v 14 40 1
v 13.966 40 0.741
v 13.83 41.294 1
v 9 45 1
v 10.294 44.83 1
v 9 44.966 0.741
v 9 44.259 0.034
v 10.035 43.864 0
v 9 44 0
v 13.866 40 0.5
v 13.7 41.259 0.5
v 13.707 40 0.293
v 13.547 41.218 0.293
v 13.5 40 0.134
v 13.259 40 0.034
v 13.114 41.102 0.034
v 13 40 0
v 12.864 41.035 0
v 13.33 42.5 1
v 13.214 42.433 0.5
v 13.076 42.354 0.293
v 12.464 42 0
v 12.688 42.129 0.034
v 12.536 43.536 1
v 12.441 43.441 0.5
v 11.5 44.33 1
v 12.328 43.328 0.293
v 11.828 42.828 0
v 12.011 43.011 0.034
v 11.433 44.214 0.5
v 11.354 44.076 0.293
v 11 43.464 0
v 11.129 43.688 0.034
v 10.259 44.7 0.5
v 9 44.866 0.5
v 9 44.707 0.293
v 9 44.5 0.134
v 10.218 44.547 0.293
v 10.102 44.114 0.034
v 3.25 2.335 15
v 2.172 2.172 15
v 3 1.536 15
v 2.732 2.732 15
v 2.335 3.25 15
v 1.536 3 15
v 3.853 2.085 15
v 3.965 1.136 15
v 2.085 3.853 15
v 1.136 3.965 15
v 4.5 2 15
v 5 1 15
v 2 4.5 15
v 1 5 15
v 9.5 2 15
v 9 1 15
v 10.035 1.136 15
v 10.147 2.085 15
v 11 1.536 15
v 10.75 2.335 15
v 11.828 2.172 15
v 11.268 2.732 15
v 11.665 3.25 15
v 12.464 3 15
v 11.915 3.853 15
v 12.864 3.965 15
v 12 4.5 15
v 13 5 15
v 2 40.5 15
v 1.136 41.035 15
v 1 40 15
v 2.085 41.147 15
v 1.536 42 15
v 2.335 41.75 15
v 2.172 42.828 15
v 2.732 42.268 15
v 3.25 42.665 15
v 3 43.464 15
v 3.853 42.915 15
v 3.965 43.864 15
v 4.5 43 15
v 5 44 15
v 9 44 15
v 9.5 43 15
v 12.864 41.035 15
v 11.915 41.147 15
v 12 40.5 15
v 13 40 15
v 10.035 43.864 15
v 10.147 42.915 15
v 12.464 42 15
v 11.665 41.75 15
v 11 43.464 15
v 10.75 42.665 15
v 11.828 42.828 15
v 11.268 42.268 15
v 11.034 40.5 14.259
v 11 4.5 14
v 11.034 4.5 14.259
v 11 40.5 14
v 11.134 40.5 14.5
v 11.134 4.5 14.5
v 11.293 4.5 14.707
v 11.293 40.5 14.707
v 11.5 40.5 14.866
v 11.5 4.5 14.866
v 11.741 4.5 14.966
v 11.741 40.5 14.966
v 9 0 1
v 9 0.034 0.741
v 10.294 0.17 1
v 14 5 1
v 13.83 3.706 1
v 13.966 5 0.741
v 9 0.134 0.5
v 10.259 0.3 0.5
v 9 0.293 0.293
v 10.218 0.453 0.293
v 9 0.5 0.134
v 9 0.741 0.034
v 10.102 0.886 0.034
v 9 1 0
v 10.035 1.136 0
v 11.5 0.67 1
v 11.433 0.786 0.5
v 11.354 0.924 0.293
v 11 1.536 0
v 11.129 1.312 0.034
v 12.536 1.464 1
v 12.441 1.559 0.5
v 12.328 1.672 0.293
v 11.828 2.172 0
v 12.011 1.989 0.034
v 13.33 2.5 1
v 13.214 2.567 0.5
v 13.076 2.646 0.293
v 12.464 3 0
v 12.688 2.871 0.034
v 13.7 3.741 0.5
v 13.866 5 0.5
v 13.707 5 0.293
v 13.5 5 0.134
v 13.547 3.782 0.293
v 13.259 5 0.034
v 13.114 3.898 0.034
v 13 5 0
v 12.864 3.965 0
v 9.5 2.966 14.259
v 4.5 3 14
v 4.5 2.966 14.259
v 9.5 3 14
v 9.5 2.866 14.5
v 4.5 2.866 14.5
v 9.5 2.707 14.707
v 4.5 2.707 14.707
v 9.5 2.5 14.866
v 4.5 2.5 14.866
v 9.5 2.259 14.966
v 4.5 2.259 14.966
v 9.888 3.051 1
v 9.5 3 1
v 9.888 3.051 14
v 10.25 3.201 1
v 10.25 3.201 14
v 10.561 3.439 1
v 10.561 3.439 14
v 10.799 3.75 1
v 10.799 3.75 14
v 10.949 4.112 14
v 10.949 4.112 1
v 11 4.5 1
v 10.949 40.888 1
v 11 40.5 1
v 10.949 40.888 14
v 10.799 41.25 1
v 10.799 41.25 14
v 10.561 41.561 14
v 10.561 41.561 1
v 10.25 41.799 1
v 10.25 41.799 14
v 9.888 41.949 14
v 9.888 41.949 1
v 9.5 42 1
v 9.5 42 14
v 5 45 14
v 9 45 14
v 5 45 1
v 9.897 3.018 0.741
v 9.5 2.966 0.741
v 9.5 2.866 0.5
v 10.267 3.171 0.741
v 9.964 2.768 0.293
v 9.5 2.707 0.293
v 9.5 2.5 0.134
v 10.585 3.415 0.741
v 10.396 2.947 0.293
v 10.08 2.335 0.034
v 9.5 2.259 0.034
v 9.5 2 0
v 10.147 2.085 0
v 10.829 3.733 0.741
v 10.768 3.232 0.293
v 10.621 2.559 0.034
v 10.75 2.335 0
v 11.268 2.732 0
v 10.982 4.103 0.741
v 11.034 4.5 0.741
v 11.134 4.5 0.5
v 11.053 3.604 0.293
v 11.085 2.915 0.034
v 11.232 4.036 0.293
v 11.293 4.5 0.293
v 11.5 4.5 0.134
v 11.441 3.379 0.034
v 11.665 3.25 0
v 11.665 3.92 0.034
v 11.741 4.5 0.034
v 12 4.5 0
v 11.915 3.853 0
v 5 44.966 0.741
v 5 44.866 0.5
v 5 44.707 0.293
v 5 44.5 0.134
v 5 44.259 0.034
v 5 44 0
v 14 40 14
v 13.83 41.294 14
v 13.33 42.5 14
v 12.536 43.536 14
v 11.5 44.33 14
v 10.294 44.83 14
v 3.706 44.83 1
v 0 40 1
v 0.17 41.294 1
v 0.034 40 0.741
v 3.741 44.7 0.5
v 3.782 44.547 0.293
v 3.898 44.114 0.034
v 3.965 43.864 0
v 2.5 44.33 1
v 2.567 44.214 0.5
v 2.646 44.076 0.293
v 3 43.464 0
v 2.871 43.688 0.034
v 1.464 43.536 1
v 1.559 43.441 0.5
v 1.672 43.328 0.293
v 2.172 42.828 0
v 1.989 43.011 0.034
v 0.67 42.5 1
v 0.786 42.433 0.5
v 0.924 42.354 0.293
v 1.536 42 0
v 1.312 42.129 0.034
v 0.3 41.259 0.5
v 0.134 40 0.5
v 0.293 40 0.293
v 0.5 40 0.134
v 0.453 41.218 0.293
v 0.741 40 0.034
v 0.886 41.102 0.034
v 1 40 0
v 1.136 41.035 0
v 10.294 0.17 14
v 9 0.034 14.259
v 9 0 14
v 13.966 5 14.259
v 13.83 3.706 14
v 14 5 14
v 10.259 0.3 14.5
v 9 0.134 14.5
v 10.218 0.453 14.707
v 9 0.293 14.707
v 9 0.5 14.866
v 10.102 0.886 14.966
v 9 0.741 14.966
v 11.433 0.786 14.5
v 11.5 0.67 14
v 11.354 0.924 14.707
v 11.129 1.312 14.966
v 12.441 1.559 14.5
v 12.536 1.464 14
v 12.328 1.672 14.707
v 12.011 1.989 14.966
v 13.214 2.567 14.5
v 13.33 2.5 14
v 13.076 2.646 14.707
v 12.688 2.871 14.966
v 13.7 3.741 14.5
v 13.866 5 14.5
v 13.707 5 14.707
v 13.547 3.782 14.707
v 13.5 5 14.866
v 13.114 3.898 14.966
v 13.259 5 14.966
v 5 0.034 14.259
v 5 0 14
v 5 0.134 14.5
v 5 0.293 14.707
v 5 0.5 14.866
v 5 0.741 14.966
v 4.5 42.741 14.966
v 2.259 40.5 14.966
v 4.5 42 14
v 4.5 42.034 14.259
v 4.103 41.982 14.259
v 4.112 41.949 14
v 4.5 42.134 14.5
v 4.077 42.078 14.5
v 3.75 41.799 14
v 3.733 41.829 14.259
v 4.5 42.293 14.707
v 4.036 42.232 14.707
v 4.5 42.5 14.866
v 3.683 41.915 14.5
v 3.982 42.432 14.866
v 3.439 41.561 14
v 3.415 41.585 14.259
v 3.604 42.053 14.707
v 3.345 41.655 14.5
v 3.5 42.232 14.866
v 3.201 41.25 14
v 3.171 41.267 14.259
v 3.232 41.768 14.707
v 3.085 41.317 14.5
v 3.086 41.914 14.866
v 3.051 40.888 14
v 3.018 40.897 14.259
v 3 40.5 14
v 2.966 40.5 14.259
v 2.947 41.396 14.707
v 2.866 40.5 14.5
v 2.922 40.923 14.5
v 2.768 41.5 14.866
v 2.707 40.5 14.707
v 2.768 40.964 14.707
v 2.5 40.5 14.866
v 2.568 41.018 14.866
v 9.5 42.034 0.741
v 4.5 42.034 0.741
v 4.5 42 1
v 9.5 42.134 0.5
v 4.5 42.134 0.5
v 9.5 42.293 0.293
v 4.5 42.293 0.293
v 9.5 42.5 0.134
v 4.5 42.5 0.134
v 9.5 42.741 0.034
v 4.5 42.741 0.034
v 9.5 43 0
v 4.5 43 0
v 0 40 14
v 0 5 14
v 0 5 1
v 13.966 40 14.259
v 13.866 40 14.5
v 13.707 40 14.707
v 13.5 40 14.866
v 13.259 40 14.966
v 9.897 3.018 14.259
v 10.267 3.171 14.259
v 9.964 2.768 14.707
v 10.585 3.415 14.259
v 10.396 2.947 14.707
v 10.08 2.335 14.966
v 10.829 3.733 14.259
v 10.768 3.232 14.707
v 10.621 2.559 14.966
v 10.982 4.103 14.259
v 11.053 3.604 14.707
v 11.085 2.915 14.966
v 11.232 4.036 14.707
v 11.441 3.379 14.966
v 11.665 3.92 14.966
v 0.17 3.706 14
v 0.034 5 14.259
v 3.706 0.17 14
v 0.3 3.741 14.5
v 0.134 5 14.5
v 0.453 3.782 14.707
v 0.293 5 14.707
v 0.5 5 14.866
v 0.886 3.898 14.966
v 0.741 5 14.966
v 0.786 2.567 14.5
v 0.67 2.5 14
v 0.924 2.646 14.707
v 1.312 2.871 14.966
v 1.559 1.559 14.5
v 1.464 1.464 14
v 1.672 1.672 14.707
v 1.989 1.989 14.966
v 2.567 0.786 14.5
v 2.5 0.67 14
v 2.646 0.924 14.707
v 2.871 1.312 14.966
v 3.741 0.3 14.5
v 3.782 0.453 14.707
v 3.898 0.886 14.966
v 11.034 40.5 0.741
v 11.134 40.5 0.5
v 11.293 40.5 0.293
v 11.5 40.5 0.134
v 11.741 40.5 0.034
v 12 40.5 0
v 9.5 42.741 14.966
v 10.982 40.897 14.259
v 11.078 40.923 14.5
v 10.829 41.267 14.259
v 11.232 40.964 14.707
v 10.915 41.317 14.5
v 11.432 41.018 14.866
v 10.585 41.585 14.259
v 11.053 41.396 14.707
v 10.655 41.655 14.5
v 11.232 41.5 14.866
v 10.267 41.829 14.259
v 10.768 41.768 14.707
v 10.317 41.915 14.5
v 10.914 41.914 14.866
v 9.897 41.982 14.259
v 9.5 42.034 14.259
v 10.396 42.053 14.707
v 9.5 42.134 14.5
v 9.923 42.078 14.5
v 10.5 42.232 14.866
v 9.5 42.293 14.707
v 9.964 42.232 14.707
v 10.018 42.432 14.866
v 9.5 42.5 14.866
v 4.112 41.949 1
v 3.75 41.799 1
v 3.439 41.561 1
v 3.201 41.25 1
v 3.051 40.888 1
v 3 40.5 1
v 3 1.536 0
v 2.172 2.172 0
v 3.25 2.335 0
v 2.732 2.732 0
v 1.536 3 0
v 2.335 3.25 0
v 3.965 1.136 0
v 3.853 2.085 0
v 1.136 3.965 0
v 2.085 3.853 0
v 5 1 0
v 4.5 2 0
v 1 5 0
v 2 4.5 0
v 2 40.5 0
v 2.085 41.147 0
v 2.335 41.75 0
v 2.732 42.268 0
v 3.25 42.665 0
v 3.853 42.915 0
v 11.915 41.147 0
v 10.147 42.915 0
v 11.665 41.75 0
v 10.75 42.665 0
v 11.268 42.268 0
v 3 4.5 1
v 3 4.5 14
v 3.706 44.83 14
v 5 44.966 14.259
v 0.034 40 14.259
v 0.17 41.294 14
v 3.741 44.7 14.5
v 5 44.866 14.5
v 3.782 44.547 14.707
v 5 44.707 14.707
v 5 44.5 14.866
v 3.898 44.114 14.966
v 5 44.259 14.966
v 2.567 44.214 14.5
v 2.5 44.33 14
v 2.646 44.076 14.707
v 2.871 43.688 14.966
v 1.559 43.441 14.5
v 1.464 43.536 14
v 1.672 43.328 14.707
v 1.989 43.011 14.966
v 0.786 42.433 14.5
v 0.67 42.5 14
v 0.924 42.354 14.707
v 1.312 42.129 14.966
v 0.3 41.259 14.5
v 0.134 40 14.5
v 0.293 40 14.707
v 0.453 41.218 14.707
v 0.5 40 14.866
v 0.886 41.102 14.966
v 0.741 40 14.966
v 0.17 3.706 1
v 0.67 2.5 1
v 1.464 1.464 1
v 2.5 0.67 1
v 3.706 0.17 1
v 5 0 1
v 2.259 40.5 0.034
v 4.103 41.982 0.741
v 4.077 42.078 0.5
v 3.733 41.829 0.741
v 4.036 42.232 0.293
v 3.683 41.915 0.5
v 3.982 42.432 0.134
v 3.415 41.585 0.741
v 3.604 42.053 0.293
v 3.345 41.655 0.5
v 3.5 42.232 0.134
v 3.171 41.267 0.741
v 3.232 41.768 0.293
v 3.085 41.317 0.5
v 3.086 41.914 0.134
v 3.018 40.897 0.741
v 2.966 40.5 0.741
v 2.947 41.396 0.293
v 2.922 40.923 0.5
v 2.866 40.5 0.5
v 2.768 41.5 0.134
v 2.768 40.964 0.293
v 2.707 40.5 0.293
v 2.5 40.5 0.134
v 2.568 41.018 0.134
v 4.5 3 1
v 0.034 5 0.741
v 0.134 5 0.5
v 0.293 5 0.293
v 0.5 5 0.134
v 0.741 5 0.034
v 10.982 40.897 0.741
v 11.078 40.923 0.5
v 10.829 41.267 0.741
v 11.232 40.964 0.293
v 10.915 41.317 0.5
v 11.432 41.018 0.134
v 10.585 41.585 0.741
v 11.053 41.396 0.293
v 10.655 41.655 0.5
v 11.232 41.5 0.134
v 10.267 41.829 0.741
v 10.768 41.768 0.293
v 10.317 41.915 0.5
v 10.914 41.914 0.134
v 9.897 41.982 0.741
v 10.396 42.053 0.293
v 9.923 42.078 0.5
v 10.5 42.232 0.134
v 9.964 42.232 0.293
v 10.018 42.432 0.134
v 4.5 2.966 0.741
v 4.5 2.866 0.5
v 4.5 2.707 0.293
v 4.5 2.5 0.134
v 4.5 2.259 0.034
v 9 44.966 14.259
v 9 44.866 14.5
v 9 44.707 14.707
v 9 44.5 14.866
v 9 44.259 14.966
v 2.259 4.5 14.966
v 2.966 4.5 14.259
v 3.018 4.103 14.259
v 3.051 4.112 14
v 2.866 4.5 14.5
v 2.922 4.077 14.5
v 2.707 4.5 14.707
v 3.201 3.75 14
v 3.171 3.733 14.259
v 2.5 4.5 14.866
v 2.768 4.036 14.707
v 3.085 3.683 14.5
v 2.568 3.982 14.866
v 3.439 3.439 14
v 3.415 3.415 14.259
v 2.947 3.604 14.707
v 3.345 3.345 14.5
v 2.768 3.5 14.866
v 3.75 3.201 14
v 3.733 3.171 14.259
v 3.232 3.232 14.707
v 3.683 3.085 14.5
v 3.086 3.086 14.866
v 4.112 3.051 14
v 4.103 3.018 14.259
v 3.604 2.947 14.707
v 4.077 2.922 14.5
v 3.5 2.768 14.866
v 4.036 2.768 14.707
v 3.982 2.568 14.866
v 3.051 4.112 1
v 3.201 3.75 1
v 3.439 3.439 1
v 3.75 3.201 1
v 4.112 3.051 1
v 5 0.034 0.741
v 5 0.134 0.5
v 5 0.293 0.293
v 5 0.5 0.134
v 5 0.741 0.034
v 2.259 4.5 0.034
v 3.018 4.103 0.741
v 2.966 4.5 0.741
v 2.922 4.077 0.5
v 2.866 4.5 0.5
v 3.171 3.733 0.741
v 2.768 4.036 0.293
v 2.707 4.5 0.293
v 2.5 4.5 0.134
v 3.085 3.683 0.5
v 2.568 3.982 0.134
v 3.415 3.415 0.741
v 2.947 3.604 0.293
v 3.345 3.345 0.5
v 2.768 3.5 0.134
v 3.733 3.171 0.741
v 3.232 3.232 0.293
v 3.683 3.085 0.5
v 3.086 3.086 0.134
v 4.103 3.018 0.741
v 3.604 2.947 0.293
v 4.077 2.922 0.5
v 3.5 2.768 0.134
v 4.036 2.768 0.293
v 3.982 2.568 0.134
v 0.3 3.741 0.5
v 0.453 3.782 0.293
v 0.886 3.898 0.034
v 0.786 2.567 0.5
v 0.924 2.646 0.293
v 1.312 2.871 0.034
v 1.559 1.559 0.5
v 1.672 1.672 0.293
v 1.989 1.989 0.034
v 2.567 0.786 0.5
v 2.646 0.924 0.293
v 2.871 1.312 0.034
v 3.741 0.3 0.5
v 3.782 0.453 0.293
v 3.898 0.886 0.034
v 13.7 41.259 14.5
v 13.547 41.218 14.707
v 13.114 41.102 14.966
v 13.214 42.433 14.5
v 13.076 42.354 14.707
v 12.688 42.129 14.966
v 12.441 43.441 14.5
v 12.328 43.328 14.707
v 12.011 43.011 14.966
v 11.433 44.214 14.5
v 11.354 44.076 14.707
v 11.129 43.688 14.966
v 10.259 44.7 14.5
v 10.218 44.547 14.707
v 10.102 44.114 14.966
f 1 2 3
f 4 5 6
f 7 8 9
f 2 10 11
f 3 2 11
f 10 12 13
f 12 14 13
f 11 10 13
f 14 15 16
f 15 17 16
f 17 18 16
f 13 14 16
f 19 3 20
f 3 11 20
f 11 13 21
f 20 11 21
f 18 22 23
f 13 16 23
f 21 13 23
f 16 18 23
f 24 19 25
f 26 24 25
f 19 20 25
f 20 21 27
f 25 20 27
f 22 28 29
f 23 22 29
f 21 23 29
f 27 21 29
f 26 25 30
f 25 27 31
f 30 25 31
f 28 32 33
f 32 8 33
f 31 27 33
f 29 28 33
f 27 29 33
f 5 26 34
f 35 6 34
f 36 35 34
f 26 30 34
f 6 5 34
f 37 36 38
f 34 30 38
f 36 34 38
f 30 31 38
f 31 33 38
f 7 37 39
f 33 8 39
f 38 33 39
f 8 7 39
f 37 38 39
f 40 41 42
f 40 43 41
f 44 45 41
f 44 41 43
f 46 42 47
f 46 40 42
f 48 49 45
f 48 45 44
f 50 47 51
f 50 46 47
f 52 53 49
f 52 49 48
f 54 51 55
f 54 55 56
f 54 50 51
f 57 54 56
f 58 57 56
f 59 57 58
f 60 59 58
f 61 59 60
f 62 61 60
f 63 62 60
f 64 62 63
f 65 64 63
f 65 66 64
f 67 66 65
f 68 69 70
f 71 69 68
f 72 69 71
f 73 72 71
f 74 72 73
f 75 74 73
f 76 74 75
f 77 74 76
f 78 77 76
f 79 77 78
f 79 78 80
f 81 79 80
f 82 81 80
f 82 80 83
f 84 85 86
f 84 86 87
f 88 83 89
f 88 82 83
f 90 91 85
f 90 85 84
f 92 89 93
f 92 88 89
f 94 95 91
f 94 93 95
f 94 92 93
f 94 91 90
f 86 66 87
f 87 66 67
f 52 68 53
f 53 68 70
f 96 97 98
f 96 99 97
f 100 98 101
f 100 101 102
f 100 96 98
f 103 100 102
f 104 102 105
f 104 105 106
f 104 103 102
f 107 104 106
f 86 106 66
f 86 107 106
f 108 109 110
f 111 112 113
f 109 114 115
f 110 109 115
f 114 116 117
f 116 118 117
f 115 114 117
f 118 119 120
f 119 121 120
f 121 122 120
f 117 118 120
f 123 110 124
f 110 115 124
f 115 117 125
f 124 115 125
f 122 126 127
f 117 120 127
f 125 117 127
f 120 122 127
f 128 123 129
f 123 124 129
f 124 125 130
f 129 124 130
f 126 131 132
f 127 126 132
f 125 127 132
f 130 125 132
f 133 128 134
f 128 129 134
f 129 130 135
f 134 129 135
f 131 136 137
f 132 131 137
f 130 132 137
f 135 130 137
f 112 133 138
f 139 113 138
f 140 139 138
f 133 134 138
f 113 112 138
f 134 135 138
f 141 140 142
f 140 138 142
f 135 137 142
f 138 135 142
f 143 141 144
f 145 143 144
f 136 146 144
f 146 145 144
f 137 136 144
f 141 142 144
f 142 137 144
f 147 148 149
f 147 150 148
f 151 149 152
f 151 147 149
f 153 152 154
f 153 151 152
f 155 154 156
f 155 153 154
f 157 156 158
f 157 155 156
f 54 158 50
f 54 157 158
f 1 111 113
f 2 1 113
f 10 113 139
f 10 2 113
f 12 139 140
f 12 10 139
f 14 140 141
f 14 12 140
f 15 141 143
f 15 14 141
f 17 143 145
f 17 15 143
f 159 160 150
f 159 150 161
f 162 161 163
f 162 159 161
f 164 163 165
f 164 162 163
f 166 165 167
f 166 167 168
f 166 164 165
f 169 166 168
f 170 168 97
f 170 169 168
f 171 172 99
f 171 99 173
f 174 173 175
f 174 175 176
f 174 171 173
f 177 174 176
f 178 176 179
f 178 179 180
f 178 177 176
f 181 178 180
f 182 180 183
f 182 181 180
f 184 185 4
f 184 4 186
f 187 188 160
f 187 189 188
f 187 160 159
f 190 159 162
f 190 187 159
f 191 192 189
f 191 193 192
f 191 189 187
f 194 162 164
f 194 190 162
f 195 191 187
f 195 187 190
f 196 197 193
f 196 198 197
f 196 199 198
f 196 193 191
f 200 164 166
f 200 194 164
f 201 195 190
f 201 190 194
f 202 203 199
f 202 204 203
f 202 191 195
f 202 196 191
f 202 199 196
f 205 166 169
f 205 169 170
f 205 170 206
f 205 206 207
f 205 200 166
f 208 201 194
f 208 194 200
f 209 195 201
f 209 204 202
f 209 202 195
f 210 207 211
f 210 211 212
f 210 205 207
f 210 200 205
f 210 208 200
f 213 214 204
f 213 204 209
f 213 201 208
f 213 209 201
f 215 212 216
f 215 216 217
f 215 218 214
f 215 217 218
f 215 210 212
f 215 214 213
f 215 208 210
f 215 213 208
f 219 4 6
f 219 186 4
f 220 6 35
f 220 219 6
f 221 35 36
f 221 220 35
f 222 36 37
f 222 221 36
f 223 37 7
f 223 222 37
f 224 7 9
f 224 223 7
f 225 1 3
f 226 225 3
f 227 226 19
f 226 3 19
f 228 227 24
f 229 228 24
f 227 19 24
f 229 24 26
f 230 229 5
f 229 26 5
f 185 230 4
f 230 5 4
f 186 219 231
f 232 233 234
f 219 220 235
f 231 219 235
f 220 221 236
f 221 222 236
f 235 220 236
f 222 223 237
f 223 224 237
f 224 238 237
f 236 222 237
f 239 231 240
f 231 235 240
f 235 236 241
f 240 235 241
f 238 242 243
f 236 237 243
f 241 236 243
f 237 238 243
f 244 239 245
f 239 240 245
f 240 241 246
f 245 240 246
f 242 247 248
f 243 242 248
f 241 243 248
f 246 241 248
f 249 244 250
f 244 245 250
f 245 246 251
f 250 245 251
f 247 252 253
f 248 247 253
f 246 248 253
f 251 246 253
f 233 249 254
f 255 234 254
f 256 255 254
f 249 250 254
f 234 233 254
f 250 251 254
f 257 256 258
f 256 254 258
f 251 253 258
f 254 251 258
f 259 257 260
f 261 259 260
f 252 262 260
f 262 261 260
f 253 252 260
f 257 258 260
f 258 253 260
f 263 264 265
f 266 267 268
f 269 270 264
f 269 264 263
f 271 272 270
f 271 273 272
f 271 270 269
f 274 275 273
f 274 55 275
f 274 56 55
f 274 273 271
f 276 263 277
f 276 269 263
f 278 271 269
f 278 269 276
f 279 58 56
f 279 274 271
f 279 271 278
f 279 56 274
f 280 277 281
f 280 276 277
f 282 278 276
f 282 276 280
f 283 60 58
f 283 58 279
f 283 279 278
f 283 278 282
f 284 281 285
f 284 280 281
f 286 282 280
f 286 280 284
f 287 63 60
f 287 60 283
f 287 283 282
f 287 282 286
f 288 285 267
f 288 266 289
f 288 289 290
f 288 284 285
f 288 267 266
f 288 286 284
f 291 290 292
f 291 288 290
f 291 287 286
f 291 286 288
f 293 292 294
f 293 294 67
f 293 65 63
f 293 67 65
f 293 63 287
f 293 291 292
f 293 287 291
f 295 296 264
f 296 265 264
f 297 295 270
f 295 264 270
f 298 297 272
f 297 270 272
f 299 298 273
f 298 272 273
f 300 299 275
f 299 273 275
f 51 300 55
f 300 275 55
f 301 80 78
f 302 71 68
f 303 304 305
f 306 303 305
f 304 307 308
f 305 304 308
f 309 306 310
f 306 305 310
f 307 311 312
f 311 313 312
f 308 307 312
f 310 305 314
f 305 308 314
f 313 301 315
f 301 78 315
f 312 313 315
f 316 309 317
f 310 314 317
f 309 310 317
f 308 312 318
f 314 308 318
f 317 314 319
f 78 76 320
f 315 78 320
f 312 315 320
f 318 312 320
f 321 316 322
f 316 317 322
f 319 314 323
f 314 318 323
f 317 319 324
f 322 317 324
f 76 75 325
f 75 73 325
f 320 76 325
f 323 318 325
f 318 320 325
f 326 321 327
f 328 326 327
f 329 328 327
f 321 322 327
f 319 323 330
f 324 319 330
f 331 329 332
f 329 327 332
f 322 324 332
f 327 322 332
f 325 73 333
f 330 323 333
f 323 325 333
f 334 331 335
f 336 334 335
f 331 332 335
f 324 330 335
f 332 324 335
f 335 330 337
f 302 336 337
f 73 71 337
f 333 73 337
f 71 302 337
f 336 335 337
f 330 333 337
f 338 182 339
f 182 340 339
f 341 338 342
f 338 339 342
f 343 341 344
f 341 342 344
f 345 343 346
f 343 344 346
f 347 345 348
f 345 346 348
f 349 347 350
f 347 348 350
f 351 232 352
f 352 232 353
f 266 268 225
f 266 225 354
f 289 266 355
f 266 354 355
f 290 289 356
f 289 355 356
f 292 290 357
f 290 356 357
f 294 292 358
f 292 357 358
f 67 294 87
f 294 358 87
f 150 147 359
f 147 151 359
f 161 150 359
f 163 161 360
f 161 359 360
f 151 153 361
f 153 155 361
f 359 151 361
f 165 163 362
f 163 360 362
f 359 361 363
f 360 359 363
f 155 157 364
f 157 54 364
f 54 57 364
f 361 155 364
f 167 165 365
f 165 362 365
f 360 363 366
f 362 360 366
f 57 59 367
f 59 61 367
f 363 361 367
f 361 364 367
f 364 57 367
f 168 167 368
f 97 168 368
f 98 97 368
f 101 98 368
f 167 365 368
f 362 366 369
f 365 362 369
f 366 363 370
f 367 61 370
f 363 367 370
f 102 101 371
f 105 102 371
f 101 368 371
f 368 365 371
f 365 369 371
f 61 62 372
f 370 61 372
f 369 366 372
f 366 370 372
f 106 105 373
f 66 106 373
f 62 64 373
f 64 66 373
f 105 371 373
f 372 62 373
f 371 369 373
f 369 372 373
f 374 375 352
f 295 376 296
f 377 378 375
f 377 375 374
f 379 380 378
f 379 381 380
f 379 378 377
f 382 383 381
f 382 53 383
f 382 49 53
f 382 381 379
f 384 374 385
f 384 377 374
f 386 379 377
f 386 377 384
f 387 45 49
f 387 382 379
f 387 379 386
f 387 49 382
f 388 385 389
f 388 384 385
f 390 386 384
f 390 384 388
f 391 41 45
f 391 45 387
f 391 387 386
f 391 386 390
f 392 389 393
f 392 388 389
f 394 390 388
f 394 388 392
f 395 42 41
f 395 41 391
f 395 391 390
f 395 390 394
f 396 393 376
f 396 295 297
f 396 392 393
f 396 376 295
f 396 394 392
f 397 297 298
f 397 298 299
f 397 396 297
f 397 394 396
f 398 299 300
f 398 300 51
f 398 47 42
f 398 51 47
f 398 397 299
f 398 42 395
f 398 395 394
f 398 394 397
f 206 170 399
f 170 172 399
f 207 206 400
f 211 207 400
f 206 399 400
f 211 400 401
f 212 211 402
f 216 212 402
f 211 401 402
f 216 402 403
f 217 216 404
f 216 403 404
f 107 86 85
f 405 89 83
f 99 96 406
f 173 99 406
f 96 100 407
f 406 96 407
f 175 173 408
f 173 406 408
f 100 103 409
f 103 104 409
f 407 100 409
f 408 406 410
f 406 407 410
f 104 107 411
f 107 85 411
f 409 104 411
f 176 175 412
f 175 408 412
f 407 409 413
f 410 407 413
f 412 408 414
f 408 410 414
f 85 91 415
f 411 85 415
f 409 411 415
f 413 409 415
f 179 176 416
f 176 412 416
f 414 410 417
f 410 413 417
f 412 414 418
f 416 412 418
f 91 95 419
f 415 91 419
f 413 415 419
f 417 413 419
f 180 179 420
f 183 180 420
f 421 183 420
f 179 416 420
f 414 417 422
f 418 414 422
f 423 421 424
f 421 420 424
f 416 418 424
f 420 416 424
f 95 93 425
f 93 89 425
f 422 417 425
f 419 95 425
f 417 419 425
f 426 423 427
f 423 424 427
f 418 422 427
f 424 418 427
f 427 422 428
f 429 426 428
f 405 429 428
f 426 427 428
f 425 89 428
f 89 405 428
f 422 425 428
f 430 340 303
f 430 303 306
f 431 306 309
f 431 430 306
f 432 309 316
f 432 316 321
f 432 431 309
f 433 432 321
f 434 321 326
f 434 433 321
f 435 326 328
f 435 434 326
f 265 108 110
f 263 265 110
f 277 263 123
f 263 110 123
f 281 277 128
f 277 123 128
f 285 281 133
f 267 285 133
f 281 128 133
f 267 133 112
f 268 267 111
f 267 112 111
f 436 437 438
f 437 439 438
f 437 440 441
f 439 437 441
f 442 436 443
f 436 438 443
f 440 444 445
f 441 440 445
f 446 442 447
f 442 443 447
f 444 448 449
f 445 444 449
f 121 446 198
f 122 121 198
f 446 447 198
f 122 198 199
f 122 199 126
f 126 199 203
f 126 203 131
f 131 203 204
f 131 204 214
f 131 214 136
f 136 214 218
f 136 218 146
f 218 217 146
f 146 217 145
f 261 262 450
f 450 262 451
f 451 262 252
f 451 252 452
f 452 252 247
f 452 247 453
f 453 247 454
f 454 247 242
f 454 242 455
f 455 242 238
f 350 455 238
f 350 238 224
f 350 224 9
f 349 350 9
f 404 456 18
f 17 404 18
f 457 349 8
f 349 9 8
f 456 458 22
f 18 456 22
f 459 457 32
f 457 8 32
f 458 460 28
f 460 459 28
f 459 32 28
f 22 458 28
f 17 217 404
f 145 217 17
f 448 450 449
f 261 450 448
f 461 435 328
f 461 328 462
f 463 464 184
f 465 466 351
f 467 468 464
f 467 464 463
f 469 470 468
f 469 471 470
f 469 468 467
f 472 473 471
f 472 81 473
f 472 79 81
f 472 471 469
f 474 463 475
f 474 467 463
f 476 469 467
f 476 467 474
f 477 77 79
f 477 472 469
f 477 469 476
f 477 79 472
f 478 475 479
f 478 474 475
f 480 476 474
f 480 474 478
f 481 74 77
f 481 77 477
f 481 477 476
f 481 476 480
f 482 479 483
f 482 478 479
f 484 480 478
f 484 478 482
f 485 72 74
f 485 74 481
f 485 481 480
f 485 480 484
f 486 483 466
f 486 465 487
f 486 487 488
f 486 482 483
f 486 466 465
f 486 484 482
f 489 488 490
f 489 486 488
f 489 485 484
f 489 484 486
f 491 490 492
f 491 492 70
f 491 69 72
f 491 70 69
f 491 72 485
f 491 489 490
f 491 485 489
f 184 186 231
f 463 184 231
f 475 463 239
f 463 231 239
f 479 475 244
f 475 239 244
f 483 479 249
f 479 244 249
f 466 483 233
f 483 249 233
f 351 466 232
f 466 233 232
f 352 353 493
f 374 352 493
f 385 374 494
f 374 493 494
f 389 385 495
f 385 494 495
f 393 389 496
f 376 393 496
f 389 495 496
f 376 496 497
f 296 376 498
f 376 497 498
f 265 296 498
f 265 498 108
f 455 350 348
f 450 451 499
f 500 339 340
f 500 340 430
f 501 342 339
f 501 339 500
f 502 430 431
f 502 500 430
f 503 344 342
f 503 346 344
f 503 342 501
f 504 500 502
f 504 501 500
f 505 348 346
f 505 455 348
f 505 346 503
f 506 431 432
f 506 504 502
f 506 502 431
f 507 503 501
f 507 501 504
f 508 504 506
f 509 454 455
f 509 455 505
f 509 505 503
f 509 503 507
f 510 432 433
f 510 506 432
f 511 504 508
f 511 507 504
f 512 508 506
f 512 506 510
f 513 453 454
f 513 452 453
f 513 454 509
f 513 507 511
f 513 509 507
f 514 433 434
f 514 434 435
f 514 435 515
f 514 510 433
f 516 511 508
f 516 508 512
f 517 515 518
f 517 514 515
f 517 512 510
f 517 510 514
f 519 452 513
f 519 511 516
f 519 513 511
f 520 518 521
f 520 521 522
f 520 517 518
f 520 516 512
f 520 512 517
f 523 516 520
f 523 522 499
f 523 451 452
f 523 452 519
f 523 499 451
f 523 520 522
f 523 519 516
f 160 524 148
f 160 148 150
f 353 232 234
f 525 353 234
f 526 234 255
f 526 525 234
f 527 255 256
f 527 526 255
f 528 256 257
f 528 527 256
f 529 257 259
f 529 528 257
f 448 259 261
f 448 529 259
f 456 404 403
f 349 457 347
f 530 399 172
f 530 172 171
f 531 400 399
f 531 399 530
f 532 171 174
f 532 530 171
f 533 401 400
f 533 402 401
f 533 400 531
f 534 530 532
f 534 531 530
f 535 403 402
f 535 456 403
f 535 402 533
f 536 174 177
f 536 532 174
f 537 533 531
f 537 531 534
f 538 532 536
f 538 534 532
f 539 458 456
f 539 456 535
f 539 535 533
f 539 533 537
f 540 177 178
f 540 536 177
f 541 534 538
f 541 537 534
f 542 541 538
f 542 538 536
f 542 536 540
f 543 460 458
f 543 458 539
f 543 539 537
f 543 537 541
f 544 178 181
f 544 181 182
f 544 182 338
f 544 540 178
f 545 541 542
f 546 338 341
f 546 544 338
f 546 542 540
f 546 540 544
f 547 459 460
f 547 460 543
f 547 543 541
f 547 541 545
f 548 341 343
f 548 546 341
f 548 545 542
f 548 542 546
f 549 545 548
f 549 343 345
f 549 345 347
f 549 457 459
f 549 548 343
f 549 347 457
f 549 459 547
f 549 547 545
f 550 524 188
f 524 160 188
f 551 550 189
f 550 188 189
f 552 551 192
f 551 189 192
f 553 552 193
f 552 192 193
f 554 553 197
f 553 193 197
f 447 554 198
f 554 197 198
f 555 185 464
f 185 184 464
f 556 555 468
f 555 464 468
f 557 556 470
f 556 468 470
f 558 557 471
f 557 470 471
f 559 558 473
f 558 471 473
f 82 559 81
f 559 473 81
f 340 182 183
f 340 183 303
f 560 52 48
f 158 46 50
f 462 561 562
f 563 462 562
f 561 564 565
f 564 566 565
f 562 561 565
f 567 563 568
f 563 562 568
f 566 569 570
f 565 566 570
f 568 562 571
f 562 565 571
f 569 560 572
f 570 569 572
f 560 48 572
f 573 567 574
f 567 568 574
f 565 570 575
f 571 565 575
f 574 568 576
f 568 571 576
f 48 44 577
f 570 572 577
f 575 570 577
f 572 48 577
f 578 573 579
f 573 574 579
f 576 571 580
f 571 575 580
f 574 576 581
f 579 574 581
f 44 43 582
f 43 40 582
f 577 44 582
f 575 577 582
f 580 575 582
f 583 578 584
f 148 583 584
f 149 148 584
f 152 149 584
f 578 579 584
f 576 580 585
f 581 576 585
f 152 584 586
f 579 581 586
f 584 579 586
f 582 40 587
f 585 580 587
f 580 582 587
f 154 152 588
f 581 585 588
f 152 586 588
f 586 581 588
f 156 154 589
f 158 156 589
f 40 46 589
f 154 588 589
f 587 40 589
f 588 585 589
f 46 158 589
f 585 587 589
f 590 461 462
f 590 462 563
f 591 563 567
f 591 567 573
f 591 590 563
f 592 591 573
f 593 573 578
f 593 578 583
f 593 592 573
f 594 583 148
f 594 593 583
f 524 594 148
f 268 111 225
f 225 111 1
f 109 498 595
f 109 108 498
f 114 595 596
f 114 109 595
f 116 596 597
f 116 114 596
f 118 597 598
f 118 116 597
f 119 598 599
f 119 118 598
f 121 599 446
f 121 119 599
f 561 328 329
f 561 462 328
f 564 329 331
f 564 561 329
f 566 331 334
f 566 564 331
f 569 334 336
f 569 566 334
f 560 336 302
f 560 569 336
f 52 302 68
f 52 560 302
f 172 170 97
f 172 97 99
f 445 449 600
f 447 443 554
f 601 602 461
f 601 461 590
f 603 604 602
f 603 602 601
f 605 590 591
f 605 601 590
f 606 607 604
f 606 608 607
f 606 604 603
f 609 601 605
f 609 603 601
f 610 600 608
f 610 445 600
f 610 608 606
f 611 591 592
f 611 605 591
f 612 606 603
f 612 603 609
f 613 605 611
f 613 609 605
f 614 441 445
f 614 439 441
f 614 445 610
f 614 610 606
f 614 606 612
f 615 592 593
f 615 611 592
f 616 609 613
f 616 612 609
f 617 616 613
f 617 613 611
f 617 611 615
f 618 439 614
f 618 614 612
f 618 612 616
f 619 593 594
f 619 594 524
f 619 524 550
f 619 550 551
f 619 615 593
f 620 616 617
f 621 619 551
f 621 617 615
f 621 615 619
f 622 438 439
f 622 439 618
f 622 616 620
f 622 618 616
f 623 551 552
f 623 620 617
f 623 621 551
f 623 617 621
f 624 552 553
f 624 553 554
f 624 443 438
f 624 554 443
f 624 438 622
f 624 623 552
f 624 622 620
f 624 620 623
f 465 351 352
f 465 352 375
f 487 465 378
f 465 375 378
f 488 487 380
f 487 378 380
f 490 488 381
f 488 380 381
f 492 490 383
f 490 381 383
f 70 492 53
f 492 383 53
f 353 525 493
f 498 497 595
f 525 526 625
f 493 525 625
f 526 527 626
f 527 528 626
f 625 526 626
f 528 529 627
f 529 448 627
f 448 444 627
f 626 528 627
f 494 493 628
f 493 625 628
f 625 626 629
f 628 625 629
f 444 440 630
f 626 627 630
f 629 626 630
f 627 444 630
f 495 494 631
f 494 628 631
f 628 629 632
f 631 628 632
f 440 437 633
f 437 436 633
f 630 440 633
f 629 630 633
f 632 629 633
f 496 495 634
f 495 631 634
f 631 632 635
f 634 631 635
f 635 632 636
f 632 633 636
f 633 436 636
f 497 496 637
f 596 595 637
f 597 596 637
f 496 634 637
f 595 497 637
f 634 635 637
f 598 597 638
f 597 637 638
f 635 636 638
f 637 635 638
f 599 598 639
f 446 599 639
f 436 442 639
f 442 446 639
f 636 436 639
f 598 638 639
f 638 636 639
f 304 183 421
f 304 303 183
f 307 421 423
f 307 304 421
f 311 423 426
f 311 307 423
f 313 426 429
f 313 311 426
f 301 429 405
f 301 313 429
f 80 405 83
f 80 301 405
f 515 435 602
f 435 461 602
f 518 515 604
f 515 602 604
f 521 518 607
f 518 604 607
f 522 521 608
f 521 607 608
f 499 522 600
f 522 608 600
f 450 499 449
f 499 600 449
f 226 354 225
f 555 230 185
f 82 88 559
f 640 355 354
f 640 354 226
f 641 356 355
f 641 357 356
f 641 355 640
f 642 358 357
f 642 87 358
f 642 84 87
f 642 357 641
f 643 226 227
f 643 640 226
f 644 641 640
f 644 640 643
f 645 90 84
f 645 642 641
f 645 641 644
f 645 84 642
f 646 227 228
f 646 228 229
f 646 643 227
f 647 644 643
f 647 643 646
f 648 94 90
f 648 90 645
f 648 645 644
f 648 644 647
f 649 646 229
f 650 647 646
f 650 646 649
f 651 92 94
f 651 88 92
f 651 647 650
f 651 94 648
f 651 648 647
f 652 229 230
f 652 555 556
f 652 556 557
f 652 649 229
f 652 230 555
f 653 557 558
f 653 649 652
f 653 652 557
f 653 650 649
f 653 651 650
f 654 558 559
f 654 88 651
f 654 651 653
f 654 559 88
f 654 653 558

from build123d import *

# Parameters (mm, degrees)
PAD_DEPTH = 15
FILLET_R  = 1


with BuildPart() as part:
    # Sketch → Pad (new body)
    with BuildSketch(Plane.XY):
        with BuildLine():
            Line((5, 0), (9, 0))
            ThreePointArc((9, 0), (12.535534, 1.464466), (14, 5))
            Line((14, 5), (14, 40))
            ThreePointArc((14, 40), (12.535534, 43.535534), (9, 45))
            Line((9, 45), (5, 45))
            ThreePointArc((5, 45), (1.464466, 43.535534), (0, 40))
            Line((0, 40), (0, 5))
            ThreePointArc((0, 5), (1.464466, 1.464466), (5, 0))
        make_face()
        with BuildLine():
            Line((4.5, 3), (9.5, 3))
            ThreePointArc((9.5, 3), (10.56066, 3.43934), (11, 4.5))
            Line((11, 4.5), (11, 40.5))
            ThreePointArc((11, 40.5), (10.56066, 41.56066), (9.5, 42))
            Line((9.5, 42), (4.5, 42))
            ThreePointArc((4.5, 42), (3.43934, 41.56066), (3, 40.5))
            Line((3, 40.5), (3, 4.5))
            ThreePointArc((3, 4.5), (3.43934, 3.43934), (4.5, 3))
        make_face(mode=Mode.SUBTRACT)
    extrude(amount=PAD_DEPTH)

    # Fillet
    fillet_edges = [part.edges().sort_by_distance(p)[0] for p in [
        (11, 22.5, 15),
        (14, 22.5, 15),
        (14, 22.5, 0),
        (11, 22.5, 0),
    ]]
    fillet(fillet_edges, radius=FILLET_R)


solid = part.part
